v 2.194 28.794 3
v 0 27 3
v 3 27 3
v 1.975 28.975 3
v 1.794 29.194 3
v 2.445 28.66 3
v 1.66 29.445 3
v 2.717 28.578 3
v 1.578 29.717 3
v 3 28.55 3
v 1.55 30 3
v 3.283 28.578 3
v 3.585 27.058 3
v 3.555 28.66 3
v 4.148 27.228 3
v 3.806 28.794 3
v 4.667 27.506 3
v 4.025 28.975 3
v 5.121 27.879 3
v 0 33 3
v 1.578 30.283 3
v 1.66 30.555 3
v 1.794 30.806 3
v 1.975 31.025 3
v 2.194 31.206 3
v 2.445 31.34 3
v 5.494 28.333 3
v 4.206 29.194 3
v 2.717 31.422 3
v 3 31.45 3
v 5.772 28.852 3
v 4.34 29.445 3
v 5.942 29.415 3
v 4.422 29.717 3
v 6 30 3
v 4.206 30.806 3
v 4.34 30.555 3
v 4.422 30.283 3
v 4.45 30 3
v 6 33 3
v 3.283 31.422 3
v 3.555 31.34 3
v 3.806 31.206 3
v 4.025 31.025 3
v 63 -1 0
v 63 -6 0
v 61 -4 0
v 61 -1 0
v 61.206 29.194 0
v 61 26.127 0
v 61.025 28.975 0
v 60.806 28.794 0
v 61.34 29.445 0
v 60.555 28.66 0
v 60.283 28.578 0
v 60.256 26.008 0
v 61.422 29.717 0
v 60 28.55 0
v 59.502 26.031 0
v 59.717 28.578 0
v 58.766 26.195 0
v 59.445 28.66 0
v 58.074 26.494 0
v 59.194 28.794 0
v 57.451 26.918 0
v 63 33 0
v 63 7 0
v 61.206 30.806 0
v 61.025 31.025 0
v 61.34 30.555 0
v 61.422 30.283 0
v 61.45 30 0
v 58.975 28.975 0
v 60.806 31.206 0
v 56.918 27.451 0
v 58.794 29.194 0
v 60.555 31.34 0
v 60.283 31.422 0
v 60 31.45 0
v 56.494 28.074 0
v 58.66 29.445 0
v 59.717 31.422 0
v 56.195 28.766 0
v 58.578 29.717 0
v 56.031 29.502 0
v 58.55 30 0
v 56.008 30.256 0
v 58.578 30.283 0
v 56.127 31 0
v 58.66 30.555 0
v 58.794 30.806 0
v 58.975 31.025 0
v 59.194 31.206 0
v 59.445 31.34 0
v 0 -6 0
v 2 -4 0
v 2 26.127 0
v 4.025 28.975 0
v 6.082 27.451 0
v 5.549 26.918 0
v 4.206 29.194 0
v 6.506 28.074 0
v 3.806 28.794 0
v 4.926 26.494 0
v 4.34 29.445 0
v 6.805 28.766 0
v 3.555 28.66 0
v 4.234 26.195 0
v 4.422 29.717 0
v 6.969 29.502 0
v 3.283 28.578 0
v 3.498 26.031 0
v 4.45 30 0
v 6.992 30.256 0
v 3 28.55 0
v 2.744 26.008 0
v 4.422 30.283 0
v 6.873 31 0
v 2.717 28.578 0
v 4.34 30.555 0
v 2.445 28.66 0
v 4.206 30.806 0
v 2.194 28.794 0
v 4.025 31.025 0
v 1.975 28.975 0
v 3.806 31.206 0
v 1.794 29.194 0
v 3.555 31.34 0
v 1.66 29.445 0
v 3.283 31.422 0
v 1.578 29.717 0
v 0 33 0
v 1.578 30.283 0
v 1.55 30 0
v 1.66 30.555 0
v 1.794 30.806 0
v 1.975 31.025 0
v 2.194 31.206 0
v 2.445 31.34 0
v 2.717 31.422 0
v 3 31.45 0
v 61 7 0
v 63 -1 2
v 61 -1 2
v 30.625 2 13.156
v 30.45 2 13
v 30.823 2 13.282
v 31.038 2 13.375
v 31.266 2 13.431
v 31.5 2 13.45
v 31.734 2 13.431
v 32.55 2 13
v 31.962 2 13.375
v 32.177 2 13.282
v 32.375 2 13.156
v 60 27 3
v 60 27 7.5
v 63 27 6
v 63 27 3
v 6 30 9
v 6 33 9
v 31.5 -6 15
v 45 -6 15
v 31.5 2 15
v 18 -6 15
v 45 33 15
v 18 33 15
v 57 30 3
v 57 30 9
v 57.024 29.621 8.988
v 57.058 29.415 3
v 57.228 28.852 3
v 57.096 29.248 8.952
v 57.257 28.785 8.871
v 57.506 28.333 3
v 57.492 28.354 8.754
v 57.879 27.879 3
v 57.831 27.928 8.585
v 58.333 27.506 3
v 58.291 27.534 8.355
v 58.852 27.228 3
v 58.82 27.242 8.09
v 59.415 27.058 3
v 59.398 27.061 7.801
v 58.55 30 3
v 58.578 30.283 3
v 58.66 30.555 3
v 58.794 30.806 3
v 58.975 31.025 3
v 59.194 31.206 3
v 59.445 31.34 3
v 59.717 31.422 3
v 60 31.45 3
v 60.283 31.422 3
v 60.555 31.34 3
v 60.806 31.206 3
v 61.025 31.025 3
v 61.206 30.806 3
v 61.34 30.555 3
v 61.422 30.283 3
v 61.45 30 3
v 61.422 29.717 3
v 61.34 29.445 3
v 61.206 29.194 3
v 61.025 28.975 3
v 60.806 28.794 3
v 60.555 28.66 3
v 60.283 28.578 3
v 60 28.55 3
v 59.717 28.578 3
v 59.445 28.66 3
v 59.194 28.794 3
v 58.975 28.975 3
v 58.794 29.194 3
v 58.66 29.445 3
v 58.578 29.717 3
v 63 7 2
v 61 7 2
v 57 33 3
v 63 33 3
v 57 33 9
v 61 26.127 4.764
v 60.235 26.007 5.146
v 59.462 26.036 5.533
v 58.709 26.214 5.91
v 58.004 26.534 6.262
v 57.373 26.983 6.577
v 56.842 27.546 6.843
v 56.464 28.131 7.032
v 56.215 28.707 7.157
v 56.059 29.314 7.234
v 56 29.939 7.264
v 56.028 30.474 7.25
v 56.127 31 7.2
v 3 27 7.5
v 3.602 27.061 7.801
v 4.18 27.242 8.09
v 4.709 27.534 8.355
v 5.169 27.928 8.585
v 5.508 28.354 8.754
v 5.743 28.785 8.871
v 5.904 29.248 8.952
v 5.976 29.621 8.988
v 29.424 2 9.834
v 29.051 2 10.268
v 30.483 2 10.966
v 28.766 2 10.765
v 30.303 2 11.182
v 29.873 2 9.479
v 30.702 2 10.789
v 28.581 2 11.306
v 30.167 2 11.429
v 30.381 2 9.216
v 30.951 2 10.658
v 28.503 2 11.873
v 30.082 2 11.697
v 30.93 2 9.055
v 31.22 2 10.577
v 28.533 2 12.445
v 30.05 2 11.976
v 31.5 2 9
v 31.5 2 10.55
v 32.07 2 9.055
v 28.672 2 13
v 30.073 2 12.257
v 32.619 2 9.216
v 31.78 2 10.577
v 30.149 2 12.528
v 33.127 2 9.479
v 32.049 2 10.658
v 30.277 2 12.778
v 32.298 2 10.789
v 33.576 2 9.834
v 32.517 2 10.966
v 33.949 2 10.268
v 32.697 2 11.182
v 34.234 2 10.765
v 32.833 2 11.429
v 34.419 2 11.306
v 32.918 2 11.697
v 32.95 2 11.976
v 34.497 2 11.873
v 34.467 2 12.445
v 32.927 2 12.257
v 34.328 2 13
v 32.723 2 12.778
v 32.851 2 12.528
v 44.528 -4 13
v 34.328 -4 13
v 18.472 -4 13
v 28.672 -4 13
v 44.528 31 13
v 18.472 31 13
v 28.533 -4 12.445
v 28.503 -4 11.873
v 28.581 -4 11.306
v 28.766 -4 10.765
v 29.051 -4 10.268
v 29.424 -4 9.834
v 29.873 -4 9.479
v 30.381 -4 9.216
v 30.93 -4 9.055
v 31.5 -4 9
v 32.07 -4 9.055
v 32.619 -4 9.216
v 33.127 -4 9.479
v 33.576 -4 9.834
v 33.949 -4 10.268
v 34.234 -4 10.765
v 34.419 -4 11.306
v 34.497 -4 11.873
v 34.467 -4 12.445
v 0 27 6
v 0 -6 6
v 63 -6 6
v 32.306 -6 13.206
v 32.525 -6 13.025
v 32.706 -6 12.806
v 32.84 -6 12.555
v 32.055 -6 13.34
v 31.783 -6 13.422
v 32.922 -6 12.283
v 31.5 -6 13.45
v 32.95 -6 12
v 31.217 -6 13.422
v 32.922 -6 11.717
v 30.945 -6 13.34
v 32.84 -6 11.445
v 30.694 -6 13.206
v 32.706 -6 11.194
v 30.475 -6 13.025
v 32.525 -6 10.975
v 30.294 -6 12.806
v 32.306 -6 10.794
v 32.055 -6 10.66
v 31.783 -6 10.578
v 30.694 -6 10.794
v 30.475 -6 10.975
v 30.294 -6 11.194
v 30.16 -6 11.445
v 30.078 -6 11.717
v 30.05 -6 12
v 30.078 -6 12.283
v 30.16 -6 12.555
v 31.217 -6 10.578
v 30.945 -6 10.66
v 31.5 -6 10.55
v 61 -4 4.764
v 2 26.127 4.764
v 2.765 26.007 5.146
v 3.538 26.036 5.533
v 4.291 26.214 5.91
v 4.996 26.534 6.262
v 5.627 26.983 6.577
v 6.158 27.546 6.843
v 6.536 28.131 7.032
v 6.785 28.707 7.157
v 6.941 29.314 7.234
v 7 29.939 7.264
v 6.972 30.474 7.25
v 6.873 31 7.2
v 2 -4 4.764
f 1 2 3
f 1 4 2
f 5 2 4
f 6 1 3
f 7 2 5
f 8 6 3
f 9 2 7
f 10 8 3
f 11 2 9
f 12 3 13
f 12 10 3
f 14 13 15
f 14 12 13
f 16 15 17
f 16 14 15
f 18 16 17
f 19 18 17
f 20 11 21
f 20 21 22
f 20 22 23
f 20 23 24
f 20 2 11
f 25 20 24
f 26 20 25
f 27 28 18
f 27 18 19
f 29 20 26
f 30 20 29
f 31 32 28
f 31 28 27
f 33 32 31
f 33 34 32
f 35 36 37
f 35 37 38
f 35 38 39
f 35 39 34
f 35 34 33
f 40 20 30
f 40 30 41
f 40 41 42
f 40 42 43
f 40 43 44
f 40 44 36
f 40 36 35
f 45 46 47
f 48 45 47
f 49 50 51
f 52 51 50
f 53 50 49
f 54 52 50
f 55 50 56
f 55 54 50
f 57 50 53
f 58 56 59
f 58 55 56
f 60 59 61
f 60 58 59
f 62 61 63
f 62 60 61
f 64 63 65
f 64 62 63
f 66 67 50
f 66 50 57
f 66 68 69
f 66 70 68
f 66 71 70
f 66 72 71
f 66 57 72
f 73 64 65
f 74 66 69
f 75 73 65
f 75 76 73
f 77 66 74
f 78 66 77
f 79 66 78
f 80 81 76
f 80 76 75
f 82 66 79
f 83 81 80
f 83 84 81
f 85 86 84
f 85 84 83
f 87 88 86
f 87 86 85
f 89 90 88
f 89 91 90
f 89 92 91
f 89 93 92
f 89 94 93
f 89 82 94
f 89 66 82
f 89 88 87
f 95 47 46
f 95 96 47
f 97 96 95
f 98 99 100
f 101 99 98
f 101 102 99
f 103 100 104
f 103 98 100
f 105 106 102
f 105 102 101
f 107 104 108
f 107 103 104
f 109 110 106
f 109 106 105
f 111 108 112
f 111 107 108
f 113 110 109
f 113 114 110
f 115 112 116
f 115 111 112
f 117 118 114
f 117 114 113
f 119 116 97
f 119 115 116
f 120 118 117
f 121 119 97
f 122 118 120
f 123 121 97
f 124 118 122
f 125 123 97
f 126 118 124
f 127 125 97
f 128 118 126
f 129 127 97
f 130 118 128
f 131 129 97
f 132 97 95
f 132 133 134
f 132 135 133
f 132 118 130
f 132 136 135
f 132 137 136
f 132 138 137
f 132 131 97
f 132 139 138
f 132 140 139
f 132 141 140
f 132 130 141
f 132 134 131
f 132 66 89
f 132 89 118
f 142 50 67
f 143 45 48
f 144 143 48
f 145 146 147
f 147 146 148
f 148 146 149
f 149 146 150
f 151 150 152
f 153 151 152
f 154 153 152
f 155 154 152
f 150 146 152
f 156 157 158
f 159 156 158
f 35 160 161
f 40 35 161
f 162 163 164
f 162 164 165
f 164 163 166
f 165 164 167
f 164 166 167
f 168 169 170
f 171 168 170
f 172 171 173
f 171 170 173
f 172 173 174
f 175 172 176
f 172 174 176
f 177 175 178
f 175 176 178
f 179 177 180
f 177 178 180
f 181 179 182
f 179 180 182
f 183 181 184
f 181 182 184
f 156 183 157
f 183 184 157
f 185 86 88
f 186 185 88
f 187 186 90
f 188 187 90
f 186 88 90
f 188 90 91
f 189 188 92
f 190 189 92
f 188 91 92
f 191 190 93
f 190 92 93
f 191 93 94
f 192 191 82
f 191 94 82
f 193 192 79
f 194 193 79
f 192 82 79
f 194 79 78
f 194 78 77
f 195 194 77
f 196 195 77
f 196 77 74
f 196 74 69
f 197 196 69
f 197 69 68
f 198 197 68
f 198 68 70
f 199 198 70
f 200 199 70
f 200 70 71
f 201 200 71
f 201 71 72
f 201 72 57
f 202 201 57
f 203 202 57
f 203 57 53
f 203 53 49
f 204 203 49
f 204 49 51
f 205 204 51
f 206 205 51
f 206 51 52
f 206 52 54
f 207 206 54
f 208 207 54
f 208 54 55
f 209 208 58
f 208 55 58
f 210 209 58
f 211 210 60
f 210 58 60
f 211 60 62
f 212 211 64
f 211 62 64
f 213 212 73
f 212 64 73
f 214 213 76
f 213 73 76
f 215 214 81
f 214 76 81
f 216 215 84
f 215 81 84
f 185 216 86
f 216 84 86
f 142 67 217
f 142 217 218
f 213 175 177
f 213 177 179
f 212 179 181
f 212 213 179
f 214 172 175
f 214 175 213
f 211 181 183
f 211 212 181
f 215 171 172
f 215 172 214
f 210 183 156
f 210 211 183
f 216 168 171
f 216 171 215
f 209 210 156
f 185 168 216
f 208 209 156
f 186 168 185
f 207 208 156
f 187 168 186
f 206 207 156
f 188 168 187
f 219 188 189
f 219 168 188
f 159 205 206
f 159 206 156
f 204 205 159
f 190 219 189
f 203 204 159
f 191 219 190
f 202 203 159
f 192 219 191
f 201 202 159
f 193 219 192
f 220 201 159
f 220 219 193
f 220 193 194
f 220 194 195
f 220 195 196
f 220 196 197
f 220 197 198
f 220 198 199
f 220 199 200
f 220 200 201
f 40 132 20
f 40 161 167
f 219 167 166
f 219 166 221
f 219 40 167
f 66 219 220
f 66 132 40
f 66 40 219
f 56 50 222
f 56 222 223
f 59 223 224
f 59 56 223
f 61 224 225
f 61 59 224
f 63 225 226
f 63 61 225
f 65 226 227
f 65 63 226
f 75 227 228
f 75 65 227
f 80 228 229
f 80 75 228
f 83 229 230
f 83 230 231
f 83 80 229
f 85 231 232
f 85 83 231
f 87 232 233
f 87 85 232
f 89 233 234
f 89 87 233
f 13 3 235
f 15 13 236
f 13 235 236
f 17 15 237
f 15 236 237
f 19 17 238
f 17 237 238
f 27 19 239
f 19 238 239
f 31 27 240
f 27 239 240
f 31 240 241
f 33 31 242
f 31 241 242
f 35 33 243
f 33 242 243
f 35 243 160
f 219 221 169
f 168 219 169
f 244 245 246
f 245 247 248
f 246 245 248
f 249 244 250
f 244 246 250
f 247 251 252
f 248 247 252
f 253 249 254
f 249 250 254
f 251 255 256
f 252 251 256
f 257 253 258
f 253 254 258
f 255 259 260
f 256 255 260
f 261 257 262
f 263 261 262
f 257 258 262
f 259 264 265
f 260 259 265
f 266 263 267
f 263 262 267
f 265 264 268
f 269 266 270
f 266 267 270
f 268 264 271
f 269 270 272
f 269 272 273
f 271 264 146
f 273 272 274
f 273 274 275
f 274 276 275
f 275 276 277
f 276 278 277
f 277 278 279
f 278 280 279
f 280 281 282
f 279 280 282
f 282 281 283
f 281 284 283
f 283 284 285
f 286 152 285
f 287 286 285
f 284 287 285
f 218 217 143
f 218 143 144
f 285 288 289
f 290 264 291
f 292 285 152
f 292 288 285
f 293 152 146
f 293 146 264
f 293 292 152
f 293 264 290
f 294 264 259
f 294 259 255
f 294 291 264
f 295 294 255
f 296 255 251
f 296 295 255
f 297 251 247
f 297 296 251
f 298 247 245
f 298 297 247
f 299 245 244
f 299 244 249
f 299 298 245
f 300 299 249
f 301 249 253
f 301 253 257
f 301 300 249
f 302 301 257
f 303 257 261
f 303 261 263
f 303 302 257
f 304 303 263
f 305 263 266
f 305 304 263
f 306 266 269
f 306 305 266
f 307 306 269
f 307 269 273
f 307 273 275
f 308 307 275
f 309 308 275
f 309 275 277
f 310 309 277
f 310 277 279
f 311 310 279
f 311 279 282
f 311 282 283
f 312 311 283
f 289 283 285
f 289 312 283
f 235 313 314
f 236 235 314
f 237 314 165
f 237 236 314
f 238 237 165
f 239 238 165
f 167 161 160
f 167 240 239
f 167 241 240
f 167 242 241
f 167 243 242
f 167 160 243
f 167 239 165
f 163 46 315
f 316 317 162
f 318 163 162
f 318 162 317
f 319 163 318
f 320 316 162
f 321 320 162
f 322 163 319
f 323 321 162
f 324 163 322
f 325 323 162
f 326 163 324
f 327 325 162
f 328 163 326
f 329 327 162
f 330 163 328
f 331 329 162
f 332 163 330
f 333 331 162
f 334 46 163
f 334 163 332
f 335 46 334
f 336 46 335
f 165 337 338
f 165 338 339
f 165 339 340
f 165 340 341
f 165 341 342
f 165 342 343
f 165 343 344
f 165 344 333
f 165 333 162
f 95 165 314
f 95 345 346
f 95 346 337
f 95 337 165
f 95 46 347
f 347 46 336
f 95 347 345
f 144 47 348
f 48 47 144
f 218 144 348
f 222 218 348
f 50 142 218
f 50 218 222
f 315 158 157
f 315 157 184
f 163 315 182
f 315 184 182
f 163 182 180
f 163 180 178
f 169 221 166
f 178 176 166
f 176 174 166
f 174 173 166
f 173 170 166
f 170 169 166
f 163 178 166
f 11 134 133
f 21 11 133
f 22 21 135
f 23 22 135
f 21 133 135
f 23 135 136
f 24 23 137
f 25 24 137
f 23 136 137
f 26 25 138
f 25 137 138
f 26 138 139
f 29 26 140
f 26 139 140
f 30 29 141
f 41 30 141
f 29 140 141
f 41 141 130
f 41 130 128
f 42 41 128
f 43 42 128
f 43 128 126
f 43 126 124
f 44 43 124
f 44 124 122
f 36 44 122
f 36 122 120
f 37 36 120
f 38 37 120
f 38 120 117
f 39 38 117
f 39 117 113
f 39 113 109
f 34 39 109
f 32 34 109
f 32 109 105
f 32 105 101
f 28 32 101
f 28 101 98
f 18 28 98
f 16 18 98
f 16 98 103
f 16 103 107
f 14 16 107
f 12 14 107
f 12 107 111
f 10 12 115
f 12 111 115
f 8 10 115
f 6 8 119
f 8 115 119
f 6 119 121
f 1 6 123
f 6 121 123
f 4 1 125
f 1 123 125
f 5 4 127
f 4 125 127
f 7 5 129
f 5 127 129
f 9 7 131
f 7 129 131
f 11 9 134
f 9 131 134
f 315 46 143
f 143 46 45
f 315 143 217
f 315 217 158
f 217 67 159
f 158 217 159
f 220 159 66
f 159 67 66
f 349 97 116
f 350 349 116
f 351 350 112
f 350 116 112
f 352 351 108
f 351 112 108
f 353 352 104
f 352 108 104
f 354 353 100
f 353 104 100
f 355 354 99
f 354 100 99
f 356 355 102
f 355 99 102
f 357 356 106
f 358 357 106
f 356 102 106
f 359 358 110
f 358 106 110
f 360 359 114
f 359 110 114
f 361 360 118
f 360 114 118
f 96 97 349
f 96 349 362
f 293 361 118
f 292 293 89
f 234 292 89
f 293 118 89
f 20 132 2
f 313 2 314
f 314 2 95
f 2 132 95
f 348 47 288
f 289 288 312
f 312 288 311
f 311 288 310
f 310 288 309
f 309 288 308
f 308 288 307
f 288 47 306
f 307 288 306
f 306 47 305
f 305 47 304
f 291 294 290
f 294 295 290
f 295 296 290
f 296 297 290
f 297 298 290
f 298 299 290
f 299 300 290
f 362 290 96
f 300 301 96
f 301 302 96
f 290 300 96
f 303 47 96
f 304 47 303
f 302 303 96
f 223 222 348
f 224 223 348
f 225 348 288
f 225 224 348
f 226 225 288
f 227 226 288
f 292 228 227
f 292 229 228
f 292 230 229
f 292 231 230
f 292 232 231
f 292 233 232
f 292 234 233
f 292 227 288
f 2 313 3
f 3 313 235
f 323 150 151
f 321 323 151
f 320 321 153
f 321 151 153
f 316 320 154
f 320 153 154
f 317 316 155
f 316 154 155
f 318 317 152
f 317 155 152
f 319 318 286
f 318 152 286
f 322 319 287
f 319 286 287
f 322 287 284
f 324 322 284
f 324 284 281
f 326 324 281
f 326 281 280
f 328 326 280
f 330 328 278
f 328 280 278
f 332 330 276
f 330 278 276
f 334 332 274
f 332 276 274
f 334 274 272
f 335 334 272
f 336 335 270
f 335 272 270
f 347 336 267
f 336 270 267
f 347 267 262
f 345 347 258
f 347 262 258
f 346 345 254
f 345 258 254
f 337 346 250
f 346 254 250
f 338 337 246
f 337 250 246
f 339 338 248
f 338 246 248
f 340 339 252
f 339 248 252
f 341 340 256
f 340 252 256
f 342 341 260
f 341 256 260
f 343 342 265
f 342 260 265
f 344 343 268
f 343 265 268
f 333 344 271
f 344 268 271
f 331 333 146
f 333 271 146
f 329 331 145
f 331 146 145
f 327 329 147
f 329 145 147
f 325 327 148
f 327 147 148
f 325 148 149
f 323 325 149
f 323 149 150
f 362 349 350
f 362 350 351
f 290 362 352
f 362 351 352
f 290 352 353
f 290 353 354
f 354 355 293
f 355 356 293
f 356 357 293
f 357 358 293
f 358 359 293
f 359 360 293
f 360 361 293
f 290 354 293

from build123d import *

# Parameters (mm, degrees)
SALIENTE_EXTRUIR1_DEPTH    = 15
CORTAR_EXTRUIR1_DEPTH      = 10
CORTAR_EXTRUIR1_DEPTH_BACK = 39
VACIADO1_T                 = -2
SALIENTE_EXTRUIR2_DEPTH    = 10
CORTAR_EXTRUIR2_DEPTH      = 39
CROQUIS9_R                 = 1.45
CORTAR_EXTRUIR3_DEPTH      = 33
CORTAR_EXTRUIR4_DEPTH      = 12
CROQUIS11_W                = 2
CROQUIS11_H                = 8
CORTAR_EXTRUIR5_DEPTH      = 2
CROQUIS14_R                = 3
SALIENTE_EXTRUIR3_DEPTH    = 8
CROQUIS15_R                = 1.45
CORTAR_EXTRUIR6_DEPTH      = 8


with BuildPart() as part:
    # Croquis1 → Saliente-Extruir1 (new body)
    with BuildSketch(Plane.XY):
        Polygon((0, 0), (0, 33), (63, 33), (63, 0), (63, -6), (0, -6), align=None)
    extrude(amount=SALIENTE_EXTRUIR1_DEPTH)

    # Croquis2 → Cortar-Extruir1 (cut, two sides: drawn at the far end of the back side and taken through both)
    with BuildSketch(Plane.XZ.offset(6).offset(-CORTAR_EXTRUIR1_DEPTH_BACK)):
        Polygon((0, 15), (0, 6), (18, 15), align=None)
        Polygon((63, 15), (63, 6), (45, 15), align=None)
    extrude(amount=CORTAR_EXTRUIR1_DEPTH + CORTAR_EXTRUIR1_DEPTH_BACK, mode=Mode.SUBTRACT)

    # Vaciado1
    vaciado1_openings = [part.faces().sort_by_distance(p)[0] for p in [
        (31.5, 13.5, 0),
    ]]
    offset(amount=VACIADO1_T, openings=vaciado1_openings, kind=Kind.INTERSECTION)

    # Croquis3 → Saliente-Extruir2 (add)
    with BuildSketch(Plane(origin=(0, 0, 0), x_dir=(-1, 0, 0), z_dir=(0, 0, -1))):
        with BuildLine():
            Line((-63, 30), (-63, 27.354248689))
            ThreePointArc((-63, 27.354248689), (-58.125593258, 26.466361738), (-56.127016654, 31))
            Line((-56.127016654, 31), (-57.171572875, 31))
            ThreePointArc((-57.171572875, 31), (-60.507305936, 32.956795679), (-63, 30))
        make_face()
        with BuildLine():
            Line((-6.872983346, 31), (-5.828427125, 31))
            ThreePointArc((-5.828427125, 31), (-0.878679656, 32.121320344), (-2, 27.171572875))
            Line((-2, 27.171572875), (-2, 26.127016654))
            ThreePointArc((-2, 26.127016654), (-5.828427125, 27.171572875), (-6.872983346, 31))
        make_face()
    extrude(amount=-SALIENTE_EXTRUIR2_DEPTH)

    # Croquis8 → Cortar-Extruir2 (cut)
    with BuildSketch(Plane.XZ.offset(6)):
        Polygon((0, 6), (0, 18.606217888), (63, 18.606217888), (63, 6), (45, 15), (18, 15), align=None)
    extrude(amount=-CORTAR_EXTRUIR2_DEPTH, mode=Mode.SUBTRACT)

    # Croquis9 → Cortar-Extruir3 (cut)
    with BuildSketch(Plane(origin=(0, 0, 0), x_dir=(-1, 0, 0), z_dir=(0, 0, -1))):
        with Locations((-60, 30)):
            Circle(CROQUIS9_R)
        with Locations((-3, 30)):
            Circle(CROQUIS9_R)
    extrude(amount=-CORTAR_EXTRUIR3_DEPTH, mode=Mode.SUBTRACT)

    # Croquis10 → Cortar-Extruir4 (cut)
    with BuildSketch(Plane.XY.offset(15)):
        with BuildLine():
            Line((6, 30), (6, 33))
            Line((6, 33), (0, 33))
            Line((0, 33), (0, 27))
            Line((0, 27), (3, 27))
            ThreePointArc((3, 27), (5.121320344, 27.878679656), (6, 30))
        make_face()
        with BuildLine():
            Line((60, 27), (63, 27))
            Line((63, 27), (63, 33))
            Line((63, 33), (57, 33))
            Line((57, 33), (57, 30))
            ThreePointArc((57, 30), (57.878679656, 27.878679656), (60, 27))
        make_face()
    extrude(amount=-CORTAR_EXTRUIR4_DEPTH, mode=Mode.SUBTRACT)

    # Croquis11 → Cortar-Extruir5 (cut)
    with BuildSketch(Plane(origin=(0, 0, 0), x_dir=(-1, 0, 0), z_dir=(0, 0, -1))):
        with Locations((-62, 3)):
            Rectangle(CROQUIS11_W, CROQUIS11_H)
    extrude(amount=-CORTAR_EXTRUIR5_DEPTH, mode=Mode.SUBTRACT)

    # Croquis14 → Saliente-Extruir3 (add)
    with BuildSketch(Plane.XZ.offset(6)):
        with Locations((31.5, 12)):
            Circle(CROQUIS14_R)
    extrude(amount=-SALIENTE_EXTRUIR3_DEPTH)

    # Croquis15 → Cortar-Extruir6 (cut)
    with BuildSketch(Plane(origin=(0, 2, 0), x_dir=(1, 0, 0), z_dir=(0, 1, 0))):
        with Locations(Location((31.5, -12, 0), (0, 0, 270))):
            Circle(CROQUIS15_R)
    extrude(amount=-CORTAR_EXTRUIR6_DEPTH, mode=Mode.SUBTRACT)


solid = part.part
